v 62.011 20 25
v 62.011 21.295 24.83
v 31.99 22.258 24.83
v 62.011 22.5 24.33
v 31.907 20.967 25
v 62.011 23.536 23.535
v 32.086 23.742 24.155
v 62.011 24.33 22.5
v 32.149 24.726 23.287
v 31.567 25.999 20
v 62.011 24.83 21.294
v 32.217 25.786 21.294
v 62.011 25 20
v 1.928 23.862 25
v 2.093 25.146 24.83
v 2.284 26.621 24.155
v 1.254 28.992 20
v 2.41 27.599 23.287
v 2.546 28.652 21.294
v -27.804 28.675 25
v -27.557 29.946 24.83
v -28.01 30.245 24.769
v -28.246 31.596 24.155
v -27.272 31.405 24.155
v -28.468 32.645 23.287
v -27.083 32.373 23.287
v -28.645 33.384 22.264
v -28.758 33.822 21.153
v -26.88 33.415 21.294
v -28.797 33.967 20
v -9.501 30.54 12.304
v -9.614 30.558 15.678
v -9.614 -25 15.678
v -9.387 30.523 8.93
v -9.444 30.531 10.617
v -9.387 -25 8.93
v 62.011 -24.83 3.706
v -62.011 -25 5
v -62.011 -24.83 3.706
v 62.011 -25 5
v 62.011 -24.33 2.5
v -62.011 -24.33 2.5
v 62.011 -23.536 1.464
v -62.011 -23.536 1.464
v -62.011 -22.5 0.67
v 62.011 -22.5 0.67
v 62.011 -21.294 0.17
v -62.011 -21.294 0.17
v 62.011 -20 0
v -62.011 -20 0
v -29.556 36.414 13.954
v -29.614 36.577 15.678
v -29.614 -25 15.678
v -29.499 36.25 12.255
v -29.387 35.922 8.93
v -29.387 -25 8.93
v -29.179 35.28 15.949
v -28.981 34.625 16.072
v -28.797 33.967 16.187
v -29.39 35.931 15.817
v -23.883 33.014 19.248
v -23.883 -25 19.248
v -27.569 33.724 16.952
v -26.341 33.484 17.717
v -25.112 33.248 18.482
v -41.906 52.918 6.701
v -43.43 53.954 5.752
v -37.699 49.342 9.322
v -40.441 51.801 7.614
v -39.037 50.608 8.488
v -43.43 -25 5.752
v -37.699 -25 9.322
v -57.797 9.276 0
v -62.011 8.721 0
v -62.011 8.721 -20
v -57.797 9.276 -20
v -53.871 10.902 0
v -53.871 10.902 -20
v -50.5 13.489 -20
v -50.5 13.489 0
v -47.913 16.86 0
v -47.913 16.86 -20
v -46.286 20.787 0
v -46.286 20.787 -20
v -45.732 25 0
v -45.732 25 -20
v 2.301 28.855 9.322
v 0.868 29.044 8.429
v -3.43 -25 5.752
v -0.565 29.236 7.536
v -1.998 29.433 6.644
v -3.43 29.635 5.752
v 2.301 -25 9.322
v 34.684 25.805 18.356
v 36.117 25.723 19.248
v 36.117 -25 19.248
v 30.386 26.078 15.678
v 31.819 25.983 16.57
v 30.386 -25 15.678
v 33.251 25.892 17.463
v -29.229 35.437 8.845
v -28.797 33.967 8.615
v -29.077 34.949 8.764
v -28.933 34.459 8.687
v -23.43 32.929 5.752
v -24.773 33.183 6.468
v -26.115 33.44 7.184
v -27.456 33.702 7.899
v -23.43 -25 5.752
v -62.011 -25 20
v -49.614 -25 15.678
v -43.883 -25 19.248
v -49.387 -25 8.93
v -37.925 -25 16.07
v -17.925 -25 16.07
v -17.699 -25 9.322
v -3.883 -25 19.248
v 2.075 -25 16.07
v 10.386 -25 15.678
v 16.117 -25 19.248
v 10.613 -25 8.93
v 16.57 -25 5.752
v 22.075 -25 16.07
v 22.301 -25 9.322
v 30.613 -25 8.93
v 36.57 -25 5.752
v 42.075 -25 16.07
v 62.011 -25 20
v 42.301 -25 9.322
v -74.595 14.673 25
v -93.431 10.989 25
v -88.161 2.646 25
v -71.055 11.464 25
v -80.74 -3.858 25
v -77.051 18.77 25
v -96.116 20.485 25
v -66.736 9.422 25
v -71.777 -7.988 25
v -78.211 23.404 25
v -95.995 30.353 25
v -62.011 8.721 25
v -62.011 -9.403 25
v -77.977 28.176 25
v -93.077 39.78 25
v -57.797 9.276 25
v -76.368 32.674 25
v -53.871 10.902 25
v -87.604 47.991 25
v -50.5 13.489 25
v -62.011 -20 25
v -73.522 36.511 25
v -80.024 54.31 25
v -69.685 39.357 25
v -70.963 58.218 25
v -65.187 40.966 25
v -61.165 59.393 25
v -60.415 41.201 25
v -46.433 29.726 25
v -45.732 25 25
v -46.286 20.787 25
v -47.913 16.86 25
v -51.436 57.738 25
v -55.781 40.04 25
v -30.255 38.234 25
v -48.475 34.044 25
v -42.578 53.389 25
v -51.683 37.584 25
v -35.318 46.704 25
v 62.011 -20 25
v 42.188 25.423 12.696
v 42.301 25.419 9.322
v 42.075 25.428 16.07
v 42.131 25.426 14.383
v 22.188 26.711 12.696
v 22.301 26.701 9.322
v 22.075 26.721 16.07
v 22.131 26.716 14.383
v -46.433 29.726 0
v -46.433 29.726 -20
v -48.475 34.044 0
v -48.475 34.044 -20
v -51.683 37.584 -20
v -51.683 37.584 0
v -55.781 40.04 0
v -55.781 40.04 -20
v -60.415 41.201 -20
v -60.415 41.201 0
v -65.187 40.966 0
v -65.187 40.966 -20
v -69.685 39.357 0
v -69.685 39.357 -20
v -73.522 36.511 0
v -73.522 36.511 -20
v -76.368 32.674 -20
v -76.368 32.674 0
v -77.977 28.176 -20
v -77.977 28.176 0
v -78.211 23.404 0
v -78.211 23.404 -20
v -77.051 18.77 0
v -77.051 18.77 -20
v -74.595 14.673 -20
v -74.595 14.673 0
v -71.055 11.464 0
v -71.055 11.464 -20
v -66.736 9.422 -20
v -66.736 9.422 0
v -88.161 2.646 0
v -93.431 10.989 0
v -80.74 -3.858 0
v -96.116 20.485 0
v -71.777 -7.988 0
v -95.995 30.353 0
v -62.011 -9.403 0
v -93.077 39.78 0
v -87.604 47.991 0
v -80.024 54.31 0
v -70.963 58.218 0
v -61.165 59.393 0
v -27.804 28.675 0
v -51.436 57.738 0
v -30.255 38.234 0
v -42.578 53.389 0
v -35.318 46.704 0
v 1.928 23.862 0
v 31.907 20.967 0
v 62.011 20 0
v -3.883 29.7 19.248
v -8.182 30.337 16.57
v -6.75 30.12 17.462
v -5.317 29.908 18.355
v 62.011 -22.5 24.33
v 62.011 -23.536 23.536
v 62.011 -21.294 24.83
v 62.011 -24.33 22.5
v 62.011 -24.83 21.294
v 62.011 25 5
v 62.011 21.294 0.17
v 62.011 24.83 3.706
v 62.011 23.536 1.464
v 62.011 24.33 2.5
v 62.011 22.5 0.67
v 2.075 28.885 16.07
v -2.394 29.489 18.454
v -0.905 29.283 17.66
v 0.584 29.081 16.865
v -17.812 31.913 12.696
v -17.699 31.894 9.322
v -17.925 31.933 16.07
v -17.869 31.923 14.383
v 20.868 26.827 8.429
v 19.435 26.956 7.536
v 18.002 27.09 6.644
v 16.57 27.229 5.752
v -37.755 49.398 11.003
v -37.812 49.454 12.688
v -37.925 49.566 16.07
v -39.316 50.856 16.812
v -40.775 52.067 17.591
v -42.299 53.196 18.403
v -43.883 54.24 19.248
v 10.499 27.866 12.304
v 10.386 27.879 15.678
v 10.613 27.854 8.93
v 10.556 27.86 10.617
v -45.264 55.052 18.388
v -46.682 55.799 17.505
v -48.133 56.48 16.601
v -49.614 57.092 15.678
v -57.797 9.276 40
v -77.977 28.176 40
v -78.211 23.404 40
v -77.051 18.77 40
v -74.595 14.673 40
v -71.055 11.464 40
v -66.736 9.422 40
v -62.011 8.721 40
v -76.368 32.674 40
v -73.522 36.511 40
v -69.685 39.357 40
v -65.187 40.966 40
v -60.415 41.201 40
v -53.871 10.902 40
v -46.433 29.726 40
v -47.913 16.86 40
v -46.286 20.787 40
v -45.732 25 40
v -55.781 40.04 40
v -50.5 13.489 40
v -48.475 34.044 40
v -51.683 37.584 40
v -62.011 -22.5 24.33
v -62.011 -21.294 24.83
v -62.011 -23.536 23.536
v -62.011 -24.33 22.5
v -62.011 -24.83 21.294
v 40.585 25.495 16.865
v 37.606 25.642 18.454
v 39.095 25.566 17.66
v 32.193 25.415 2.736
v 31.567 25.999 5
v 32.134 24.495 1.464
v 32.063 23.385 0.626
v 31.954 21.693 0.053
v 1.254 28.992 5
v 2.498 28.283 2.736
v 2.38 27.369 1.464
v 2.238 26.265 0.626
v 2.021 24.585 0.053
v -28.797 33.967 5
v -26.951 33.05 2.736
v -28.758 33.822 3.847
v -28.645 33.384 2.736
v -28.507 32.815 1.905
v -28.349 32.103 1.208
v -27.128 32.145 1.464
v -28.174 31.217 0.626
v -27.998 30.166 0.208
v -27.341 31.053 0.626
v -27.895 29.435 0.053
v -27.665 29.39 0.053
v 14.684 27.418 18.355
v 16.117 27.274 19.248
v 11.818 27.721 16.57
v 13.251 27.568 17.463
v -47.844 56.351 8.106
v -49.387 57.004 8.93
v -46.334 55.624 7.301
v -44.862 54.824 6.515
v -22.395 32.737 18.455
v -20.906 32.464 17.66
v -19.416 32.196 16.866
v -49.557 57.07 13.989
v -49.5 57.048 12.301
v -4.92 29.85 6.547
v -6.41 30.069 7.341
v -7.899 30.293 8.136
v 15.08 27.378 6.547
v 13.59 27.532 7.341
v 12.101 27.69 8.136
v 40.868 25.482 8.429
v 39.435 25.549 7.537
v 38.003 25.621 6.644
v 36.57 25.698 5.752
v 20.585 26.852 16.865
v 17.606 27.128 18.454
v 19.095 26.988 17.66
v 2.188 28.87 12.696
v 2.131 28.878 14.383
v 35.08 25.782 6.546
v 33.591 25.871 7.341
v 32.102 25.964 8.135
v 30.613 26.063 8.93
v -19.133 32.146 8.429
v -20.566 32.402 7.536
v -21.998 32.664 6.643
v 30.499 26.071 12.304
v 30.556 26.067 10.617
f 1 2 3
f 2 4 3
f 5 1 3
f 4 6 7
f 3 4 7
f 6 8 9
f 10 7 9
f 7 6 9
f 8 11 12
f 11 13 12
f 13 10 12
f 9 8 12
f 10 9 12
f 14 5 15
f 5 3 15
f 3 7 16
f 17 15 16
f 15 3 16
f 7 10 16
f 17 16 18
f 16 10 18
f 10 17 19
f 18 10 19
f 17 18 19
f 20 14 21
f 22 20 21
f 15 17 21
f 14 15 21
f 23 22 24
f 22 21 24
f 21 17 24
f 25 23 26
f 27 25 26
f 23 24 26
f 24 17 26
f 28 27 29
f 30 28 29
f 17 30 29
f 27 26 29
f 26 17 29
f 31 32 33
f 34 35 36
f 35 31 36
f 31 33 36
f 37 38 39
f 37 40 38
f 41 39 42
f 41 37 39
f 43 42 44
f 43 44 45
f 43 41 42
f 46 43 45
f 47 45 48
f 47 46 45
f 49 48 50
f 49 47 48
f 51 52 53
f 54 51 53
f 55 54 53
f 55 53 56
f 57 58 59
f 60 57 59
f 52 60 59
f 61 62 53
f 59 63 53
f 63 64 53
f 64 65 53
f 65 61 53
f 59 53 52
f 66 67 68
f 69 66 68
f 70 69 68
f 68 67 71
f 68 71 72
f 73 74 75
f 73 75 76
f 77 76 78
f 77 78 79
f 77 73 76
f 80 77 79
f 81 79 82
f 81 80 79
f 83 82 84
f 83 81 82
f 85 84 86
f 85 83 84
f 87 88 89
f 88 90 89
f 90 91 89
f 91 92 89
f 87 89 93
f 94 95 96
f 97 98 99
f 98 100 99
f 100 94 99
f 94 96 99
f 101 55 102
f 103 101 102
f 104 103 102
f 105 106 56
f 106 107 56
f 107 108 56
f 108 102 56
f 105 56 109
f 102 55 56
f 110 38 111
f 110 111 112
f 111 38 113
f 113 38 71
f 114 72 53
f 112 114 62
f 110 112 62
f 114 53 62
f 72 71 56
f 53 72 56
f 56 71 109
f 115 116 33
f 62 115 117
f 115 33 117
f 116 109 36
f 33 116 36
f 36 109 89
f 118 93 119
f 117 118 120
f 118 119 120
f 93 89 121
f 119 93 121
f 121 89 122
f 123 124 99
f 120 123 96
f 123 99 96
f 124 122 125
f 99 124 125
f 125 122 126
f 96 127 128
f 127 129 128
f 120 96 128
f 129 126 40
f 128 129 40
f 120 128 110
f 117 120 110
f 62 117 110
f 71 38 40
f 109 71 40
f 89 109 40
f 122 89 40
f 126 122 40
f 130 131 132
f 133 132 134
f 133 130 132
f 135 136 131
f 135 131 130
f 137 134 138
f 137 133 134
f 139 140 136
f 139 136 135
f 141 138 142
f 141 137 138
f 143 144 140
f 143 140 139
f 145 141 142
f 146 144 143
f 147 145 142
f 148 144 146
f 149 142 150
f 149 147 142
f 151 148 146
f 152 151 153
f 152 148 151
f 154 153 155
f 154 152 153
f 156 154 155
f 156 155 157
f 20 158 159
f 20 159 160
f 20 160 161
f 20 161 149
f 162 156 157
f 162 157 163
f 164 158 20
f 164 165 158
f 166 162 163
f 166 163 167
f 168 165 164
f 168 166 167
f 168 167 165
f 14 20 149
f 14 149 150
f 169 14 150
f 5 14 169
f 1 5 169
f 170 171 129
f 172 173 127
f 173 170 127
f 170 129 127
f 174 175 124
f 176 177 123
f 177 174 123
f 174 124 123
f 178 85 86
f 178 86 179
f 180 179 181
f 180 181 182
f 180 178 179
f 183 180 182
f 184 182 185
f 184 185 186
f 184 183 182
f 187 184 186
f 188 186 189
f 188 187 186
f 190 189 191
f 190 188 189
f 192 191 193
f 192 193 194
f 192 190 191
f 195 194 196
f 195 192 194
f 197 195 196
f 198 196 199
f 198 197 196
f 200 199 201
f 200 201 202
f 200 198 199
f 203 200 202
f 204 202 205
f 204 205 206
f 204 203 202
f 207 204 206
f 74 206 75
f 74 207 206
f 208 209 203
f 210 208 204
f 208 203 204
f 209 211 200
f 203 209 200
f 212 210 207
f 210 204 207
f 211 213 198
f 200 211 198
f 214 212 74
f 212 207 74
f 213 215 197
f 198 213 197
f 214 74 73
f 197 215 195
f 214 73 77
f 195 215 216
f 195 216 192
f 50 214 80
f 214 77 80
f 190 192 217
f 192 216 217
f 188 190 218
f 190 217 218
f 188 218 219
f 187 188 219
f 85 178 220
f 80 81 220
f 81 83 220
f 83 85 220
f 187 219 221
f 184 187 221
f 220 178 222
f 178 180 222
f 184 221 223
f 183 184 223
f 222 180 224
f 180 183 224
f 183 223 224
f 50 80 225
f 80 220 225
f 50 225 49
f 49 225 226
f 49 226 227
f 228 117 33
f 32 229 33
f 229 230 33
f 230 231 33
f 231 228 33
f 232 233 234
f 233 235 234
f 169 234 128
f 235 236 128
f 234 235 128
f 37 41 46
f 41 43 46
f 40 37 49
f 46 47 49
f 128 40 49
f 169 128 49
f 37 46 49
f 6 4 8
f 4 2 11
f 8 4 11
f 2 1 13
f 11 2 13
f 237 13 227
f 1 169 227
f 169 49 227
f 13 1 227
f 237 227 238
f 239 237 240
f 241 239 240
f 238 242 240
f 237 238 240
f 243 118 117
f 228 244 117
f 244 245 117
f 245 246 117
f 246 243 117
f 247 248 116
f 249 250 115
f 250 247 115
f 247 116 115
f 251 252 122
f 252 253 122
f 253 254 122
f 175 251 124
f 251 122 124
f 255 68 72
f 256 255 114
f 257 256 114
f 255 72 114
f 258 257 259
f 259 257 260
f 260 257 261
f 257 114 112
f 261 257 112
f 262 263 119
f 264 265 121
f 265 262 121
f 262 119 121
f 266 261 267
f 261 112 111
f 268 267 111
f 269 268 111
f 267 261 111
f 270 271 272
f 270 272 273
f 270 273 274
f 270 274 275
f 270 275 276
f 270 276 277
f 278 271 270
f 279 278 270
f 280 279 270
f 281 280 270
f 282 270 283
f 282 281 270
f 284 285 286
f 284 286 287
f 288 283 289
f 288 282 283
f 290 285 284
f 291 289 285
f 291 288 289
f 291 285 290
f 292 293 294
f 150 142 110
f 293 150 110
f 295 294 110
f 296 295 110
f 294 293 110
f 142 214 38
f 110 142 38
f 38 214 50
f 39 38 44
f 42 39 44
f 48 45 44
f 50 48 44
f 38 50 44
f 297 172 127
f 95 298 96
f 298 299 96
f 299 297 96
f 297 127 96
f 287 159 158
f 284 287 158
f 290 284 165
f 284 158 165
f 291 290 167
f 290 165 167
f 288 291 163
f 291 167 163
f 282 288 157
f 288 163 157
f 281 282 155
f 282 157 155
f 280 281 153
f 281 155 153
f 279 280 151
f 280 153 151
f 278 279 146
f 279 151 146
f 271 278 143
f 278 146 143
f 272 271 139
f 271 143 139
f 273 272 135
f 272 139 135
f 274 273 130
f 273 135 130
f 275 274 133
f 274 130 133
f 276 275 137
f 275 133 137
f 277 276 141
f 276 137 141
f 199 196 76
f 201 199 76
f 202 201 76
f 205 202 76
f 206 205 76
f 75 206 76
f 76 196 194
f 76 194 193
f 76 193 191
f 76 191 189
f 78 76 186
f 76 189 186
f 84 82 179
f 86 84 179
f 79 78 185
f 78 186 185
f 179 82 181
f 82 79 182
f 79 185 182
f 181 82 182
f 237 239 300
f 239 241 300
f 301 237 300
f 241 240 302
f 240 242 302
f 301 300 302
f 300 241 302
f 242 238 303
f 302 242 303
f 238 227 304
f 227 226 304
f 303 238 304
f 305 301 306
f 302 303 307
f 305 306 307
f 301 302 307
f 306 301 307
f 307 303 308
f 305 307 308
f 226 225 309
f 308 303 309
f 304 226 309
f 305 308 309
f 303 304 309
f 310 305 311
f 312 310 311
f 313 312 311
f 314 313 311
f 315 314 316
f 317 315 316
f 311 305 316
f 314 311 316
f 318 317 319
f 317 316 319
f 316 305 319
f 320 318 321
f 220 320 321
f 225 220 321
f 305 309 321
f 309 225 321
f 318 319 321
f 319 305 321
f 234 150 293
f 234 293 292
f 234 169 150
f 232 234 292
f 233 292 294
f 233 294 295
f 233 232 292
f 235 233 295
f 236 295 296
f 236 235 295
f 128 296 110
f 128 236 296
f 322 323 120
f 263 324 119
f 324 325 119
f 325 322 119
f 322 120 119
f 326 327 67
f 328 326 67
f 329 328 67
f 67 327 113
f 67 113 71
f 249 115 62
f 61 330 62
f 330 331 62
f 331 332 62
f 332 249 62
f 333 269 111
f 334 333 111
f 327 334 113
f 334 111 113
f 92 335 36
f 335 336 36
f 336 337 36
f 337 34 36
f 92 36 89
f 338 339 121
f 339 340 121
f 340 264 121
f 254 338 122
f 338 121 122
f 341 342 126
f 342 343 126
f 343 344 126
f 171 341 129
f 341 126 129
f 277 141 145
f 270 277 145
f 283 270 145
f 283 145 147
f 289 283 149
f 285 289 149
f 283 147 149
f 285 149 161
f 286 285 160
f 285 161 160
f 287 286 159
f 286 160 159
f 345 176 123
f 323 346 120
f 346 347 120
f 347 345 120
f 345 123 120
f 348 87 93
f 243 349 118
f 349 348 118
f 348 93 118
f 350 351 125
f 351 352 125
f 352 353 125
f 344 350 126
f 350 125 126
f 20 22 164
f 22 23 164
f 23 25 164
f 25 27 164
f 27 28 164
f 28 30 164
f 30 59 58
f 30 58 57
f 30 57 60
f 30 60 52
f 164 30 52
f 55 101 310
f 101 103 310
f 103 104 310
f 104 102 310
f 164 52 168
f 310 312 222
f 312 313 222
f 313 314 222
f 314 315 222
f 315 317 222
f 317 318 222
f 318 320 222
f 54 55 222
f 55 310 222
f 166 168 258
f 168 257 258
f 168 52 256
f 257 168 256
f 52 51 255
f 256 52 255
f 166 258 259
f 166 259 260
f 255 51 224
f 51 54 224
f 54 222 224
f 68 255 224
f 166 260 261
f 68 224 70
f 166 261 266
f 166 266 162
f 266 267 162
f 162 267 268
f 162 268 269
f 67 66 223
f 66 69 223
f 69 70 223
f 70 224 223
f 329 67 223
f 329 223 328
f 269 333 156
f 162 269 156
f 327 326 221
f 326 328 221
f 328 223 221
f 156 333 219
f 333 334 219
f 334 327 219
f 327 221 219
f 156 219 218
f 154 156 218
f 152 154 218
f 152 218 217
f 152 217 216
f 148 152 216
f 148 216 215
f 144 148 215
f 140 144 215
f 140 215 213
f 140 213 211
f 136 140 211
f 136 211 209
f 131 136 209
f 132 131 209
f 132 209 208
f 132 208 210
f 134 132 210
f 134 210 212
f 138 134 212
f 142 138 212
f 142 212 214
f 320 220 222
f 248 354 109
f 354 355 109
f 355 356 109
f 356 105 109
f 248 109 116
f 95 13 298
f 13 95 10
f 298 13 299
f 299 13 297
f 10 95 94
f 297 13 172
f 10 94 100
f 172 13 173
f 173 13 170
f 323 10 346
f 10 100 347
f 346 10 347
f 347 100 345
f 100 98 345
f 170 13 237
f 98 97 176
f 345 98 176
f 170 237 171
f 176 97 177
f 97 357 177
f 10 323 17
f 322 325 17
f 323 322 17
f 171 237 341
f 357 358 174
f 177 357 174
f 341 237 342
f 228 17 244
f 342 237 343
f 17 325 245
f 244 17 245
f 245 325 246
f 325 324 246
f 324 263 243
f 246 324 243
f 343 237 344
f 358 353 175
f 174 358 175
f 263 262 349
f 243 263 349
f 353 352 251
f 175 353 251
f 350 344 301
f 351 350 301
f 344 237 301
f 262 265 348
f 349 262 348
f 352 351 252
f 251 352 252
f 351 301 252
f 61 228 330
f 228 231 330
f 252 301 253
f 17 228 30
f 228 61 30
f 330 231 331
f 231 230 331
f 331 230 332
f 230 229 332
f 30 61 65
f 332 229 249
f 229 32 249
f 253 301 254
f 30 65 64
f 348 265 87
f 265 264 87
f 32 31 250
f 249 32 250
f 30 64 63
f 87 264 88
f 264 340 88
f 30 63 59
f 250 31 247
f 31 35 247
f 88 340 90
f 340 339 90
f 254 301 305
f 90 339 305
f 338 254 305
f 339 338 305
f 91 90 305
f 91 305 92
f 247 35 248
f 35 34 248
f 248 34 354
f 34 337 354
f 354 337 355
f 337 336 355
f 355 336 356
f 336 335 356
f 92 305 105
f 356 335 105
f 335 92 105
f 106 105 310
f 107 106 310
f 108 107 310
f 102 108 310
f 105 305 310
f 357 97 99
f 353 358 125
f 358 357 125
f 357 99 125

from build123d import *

# Parameters (mm, degrees)
F1_DEPTH      = 25
F2_DEPTH      = 40
F2_DEPTH_BACK = 20
F4_DEPTH      = 84.4041628775
F5_R          = 5


with BuildPart() as f1:
    # F0 (on Top) → F1 (new body)
    with BuildSketch(Plane.XY):
        with BuildLine():
            Line((-62.0106605823, -25), (62.0106605823, -25))
            Line((62.0106605823, -25), (62.0106605823, 25))
            Line((62.0106605823, 25), (-27.6074977048, 25))
            ThreePointArc((-27.6074977048, 25), (-37.6839508173, 0.6732902351), (-62.0106605823, -9.4031628775))
            Line((-62.0106605823, -9.4031628775), (-62.0106605823, -25))
        make_face()
        with BuildLine():
            Line((-27.6074977048, 25), (62.0106605823, 25))
            ThreePointArc((62.0106605823, 25), (16.3862035085, 27.2471495314), (-28.7966079142, 33.9668456737))
            ThreePointArc((-28.7966079142, 33.9668456737), (-27.9060708638, 29.5226735573), (-27.6074977048, 25))
        make_face()
        with BuildLine():
            ThreePointArc((-28.7966079142, 33.9668456737), (-89.3242603833, 45.9175735181), (-62.0106605823, -9.4031628775))
            Line((-62.0106605823, -9.4031628775), (-62.0106605823, 8.7209436981))
            ThreePointArc((-62.0106605823, 8.7209436981), (-78.1512656311, 27.1186181204), (-57.8094614837, 40.7276063092))
            ThreePointArc((-57.8094614837, 40.7276063092), (-43.3572727982, 37.1144708153), (-28.7966079142, 33.9668456737))
        make_face()
        with BuildLine():
            Line((-62.0106605823, 8.7209436981), (-62.0106605823, -9.4031628775))
            ThreePointArc((-62.0106605823, -9.4031628775), (-37.6839508173, 0.6732902351), (-27.6074977048, 25))
            Line((-27.6074977048, 25), (-45.7316042803, 25))
            ThreePointArc((-45.7316042803, 25), (-50.4996294799, 13.4889688976), (-62.0106605823, 8.7209436981))
        make_face()
        with BuildLine():
            Line((-45.7316042803, 25), (-27.6074977048, 25))
            ThreePointArc((-27.6074977048, 25), (-27.9060708638, 29.5226735573), (-28.7966079142, 33.9668456737))
            ThreePointArc((-28.7966079142, 33.9668456737), (-43.3572727982, 37.1144708153), (-57.8094614837, 40.7276063092))
            ThreePointArc((-57.8094614837, 40.7276063092), (-49.0994400601, 34.9150420428), (-45.7316042803, 25))
        make_face()
    extrude(amount=F1_DEPTH)

    # F0 (on Top) → F2 (join, two sides)
    with BuildSketch(Plane.XY) as f2_sk:
        with BuildLine():
            ThreePointArc((-57.8094614837, 40.7276063092), (-78.1512656311, 27.1186181204), (-62.0106605823, 8.7209436981))
            Line((-62.0106605823, 8.7209436981), (-62.0106605823, 25))
            Line((-62.0106605823, 25), (-45.7316042803, 25))
            ThreePointArc((-45.7316042803, 25), (-49.0994400601, 34.9150420428), (-57.8094614837, 40.7276063092))
        make_face()
        with BuildLine():
            Line((-62.0106605823, 25), (-62.0106605823, 8.7209436981))
            ThreePointArc((-62.0106605823, 8.7209436981), (-50.4996294799, 13.4889688976), (-45.7316042803, 25))
            Line((-45.7316042803, 25), (-62.0106605823, 25))
        make_face()
    extrude(amount=F2_DEPTH)
    extrude(f2_sk.sketch, amount=-F2_DEPTH_BACK)

    # F3 (on face) → F4 (cut, through all)
    with BuildSketch(Plane.XZ.offset(25)):
        Polygon((-43.4297714291, 5.7516291939), (-37.6987736764, 9.3219915203), (-37.9252992754, 16.0703623264), (-43.882822627, 19.2483708061), (-49.6138203798, 15.6780084797), (-49.3872947808, 8.9296376736), align=None)
        Polygon((-23.882822627, 19.2483708061), (-29.6138203798, 15.6780084797), (-29.3872947808, 8.9296376736), (-23.4297714291, 5.7516291939), (-17.6987736764, 9.3219915203), (-17.9252992754, 16.0703623264), align=None)
        Polygon((-3.882822627, 19.2483708061), (-9.6138203798, 15.6780084797), (-9.3872947808, 8.9296376736), (-3.4297714291, 5.7516291939), (2.3012263236, 9.3219915203), (2.0747007246, 16.0703623264), align=None)
        Polygon((16.117177373, 19.2483708061), (10.3861796202, 15.6780084797), (10.6127052192, 8.9296376736), (16.5702285709, 5.7516291939), (22.3012263236, 9.3219915203), (22.0747007246, 16.0703623264), align=None)
        Polygon((36.117177373, 19.2483708061), (30.3861796202, 15.6780084797), (30.6127052192, 8.9296376736), (36.5702285709, 5.7516291939), (42.3012263236, 9.3219915203), (42.0747007246, 16.0703623264), align=None)
    extrude(amount=-F4_DEPTH, mode=Mode.SUBTRACT)

    # F5
    f5_edges = [f1.edges().sort_by_distance(p)[0] for p in [
        (0, -25, 25),
        (0, -25, 0),
        (16.386204, 27.24715, 0),
        (16.386204, 27.24715, 25),
    ]]
    fillet(f5_edges, radius=F5_R)


solid = f1.part
